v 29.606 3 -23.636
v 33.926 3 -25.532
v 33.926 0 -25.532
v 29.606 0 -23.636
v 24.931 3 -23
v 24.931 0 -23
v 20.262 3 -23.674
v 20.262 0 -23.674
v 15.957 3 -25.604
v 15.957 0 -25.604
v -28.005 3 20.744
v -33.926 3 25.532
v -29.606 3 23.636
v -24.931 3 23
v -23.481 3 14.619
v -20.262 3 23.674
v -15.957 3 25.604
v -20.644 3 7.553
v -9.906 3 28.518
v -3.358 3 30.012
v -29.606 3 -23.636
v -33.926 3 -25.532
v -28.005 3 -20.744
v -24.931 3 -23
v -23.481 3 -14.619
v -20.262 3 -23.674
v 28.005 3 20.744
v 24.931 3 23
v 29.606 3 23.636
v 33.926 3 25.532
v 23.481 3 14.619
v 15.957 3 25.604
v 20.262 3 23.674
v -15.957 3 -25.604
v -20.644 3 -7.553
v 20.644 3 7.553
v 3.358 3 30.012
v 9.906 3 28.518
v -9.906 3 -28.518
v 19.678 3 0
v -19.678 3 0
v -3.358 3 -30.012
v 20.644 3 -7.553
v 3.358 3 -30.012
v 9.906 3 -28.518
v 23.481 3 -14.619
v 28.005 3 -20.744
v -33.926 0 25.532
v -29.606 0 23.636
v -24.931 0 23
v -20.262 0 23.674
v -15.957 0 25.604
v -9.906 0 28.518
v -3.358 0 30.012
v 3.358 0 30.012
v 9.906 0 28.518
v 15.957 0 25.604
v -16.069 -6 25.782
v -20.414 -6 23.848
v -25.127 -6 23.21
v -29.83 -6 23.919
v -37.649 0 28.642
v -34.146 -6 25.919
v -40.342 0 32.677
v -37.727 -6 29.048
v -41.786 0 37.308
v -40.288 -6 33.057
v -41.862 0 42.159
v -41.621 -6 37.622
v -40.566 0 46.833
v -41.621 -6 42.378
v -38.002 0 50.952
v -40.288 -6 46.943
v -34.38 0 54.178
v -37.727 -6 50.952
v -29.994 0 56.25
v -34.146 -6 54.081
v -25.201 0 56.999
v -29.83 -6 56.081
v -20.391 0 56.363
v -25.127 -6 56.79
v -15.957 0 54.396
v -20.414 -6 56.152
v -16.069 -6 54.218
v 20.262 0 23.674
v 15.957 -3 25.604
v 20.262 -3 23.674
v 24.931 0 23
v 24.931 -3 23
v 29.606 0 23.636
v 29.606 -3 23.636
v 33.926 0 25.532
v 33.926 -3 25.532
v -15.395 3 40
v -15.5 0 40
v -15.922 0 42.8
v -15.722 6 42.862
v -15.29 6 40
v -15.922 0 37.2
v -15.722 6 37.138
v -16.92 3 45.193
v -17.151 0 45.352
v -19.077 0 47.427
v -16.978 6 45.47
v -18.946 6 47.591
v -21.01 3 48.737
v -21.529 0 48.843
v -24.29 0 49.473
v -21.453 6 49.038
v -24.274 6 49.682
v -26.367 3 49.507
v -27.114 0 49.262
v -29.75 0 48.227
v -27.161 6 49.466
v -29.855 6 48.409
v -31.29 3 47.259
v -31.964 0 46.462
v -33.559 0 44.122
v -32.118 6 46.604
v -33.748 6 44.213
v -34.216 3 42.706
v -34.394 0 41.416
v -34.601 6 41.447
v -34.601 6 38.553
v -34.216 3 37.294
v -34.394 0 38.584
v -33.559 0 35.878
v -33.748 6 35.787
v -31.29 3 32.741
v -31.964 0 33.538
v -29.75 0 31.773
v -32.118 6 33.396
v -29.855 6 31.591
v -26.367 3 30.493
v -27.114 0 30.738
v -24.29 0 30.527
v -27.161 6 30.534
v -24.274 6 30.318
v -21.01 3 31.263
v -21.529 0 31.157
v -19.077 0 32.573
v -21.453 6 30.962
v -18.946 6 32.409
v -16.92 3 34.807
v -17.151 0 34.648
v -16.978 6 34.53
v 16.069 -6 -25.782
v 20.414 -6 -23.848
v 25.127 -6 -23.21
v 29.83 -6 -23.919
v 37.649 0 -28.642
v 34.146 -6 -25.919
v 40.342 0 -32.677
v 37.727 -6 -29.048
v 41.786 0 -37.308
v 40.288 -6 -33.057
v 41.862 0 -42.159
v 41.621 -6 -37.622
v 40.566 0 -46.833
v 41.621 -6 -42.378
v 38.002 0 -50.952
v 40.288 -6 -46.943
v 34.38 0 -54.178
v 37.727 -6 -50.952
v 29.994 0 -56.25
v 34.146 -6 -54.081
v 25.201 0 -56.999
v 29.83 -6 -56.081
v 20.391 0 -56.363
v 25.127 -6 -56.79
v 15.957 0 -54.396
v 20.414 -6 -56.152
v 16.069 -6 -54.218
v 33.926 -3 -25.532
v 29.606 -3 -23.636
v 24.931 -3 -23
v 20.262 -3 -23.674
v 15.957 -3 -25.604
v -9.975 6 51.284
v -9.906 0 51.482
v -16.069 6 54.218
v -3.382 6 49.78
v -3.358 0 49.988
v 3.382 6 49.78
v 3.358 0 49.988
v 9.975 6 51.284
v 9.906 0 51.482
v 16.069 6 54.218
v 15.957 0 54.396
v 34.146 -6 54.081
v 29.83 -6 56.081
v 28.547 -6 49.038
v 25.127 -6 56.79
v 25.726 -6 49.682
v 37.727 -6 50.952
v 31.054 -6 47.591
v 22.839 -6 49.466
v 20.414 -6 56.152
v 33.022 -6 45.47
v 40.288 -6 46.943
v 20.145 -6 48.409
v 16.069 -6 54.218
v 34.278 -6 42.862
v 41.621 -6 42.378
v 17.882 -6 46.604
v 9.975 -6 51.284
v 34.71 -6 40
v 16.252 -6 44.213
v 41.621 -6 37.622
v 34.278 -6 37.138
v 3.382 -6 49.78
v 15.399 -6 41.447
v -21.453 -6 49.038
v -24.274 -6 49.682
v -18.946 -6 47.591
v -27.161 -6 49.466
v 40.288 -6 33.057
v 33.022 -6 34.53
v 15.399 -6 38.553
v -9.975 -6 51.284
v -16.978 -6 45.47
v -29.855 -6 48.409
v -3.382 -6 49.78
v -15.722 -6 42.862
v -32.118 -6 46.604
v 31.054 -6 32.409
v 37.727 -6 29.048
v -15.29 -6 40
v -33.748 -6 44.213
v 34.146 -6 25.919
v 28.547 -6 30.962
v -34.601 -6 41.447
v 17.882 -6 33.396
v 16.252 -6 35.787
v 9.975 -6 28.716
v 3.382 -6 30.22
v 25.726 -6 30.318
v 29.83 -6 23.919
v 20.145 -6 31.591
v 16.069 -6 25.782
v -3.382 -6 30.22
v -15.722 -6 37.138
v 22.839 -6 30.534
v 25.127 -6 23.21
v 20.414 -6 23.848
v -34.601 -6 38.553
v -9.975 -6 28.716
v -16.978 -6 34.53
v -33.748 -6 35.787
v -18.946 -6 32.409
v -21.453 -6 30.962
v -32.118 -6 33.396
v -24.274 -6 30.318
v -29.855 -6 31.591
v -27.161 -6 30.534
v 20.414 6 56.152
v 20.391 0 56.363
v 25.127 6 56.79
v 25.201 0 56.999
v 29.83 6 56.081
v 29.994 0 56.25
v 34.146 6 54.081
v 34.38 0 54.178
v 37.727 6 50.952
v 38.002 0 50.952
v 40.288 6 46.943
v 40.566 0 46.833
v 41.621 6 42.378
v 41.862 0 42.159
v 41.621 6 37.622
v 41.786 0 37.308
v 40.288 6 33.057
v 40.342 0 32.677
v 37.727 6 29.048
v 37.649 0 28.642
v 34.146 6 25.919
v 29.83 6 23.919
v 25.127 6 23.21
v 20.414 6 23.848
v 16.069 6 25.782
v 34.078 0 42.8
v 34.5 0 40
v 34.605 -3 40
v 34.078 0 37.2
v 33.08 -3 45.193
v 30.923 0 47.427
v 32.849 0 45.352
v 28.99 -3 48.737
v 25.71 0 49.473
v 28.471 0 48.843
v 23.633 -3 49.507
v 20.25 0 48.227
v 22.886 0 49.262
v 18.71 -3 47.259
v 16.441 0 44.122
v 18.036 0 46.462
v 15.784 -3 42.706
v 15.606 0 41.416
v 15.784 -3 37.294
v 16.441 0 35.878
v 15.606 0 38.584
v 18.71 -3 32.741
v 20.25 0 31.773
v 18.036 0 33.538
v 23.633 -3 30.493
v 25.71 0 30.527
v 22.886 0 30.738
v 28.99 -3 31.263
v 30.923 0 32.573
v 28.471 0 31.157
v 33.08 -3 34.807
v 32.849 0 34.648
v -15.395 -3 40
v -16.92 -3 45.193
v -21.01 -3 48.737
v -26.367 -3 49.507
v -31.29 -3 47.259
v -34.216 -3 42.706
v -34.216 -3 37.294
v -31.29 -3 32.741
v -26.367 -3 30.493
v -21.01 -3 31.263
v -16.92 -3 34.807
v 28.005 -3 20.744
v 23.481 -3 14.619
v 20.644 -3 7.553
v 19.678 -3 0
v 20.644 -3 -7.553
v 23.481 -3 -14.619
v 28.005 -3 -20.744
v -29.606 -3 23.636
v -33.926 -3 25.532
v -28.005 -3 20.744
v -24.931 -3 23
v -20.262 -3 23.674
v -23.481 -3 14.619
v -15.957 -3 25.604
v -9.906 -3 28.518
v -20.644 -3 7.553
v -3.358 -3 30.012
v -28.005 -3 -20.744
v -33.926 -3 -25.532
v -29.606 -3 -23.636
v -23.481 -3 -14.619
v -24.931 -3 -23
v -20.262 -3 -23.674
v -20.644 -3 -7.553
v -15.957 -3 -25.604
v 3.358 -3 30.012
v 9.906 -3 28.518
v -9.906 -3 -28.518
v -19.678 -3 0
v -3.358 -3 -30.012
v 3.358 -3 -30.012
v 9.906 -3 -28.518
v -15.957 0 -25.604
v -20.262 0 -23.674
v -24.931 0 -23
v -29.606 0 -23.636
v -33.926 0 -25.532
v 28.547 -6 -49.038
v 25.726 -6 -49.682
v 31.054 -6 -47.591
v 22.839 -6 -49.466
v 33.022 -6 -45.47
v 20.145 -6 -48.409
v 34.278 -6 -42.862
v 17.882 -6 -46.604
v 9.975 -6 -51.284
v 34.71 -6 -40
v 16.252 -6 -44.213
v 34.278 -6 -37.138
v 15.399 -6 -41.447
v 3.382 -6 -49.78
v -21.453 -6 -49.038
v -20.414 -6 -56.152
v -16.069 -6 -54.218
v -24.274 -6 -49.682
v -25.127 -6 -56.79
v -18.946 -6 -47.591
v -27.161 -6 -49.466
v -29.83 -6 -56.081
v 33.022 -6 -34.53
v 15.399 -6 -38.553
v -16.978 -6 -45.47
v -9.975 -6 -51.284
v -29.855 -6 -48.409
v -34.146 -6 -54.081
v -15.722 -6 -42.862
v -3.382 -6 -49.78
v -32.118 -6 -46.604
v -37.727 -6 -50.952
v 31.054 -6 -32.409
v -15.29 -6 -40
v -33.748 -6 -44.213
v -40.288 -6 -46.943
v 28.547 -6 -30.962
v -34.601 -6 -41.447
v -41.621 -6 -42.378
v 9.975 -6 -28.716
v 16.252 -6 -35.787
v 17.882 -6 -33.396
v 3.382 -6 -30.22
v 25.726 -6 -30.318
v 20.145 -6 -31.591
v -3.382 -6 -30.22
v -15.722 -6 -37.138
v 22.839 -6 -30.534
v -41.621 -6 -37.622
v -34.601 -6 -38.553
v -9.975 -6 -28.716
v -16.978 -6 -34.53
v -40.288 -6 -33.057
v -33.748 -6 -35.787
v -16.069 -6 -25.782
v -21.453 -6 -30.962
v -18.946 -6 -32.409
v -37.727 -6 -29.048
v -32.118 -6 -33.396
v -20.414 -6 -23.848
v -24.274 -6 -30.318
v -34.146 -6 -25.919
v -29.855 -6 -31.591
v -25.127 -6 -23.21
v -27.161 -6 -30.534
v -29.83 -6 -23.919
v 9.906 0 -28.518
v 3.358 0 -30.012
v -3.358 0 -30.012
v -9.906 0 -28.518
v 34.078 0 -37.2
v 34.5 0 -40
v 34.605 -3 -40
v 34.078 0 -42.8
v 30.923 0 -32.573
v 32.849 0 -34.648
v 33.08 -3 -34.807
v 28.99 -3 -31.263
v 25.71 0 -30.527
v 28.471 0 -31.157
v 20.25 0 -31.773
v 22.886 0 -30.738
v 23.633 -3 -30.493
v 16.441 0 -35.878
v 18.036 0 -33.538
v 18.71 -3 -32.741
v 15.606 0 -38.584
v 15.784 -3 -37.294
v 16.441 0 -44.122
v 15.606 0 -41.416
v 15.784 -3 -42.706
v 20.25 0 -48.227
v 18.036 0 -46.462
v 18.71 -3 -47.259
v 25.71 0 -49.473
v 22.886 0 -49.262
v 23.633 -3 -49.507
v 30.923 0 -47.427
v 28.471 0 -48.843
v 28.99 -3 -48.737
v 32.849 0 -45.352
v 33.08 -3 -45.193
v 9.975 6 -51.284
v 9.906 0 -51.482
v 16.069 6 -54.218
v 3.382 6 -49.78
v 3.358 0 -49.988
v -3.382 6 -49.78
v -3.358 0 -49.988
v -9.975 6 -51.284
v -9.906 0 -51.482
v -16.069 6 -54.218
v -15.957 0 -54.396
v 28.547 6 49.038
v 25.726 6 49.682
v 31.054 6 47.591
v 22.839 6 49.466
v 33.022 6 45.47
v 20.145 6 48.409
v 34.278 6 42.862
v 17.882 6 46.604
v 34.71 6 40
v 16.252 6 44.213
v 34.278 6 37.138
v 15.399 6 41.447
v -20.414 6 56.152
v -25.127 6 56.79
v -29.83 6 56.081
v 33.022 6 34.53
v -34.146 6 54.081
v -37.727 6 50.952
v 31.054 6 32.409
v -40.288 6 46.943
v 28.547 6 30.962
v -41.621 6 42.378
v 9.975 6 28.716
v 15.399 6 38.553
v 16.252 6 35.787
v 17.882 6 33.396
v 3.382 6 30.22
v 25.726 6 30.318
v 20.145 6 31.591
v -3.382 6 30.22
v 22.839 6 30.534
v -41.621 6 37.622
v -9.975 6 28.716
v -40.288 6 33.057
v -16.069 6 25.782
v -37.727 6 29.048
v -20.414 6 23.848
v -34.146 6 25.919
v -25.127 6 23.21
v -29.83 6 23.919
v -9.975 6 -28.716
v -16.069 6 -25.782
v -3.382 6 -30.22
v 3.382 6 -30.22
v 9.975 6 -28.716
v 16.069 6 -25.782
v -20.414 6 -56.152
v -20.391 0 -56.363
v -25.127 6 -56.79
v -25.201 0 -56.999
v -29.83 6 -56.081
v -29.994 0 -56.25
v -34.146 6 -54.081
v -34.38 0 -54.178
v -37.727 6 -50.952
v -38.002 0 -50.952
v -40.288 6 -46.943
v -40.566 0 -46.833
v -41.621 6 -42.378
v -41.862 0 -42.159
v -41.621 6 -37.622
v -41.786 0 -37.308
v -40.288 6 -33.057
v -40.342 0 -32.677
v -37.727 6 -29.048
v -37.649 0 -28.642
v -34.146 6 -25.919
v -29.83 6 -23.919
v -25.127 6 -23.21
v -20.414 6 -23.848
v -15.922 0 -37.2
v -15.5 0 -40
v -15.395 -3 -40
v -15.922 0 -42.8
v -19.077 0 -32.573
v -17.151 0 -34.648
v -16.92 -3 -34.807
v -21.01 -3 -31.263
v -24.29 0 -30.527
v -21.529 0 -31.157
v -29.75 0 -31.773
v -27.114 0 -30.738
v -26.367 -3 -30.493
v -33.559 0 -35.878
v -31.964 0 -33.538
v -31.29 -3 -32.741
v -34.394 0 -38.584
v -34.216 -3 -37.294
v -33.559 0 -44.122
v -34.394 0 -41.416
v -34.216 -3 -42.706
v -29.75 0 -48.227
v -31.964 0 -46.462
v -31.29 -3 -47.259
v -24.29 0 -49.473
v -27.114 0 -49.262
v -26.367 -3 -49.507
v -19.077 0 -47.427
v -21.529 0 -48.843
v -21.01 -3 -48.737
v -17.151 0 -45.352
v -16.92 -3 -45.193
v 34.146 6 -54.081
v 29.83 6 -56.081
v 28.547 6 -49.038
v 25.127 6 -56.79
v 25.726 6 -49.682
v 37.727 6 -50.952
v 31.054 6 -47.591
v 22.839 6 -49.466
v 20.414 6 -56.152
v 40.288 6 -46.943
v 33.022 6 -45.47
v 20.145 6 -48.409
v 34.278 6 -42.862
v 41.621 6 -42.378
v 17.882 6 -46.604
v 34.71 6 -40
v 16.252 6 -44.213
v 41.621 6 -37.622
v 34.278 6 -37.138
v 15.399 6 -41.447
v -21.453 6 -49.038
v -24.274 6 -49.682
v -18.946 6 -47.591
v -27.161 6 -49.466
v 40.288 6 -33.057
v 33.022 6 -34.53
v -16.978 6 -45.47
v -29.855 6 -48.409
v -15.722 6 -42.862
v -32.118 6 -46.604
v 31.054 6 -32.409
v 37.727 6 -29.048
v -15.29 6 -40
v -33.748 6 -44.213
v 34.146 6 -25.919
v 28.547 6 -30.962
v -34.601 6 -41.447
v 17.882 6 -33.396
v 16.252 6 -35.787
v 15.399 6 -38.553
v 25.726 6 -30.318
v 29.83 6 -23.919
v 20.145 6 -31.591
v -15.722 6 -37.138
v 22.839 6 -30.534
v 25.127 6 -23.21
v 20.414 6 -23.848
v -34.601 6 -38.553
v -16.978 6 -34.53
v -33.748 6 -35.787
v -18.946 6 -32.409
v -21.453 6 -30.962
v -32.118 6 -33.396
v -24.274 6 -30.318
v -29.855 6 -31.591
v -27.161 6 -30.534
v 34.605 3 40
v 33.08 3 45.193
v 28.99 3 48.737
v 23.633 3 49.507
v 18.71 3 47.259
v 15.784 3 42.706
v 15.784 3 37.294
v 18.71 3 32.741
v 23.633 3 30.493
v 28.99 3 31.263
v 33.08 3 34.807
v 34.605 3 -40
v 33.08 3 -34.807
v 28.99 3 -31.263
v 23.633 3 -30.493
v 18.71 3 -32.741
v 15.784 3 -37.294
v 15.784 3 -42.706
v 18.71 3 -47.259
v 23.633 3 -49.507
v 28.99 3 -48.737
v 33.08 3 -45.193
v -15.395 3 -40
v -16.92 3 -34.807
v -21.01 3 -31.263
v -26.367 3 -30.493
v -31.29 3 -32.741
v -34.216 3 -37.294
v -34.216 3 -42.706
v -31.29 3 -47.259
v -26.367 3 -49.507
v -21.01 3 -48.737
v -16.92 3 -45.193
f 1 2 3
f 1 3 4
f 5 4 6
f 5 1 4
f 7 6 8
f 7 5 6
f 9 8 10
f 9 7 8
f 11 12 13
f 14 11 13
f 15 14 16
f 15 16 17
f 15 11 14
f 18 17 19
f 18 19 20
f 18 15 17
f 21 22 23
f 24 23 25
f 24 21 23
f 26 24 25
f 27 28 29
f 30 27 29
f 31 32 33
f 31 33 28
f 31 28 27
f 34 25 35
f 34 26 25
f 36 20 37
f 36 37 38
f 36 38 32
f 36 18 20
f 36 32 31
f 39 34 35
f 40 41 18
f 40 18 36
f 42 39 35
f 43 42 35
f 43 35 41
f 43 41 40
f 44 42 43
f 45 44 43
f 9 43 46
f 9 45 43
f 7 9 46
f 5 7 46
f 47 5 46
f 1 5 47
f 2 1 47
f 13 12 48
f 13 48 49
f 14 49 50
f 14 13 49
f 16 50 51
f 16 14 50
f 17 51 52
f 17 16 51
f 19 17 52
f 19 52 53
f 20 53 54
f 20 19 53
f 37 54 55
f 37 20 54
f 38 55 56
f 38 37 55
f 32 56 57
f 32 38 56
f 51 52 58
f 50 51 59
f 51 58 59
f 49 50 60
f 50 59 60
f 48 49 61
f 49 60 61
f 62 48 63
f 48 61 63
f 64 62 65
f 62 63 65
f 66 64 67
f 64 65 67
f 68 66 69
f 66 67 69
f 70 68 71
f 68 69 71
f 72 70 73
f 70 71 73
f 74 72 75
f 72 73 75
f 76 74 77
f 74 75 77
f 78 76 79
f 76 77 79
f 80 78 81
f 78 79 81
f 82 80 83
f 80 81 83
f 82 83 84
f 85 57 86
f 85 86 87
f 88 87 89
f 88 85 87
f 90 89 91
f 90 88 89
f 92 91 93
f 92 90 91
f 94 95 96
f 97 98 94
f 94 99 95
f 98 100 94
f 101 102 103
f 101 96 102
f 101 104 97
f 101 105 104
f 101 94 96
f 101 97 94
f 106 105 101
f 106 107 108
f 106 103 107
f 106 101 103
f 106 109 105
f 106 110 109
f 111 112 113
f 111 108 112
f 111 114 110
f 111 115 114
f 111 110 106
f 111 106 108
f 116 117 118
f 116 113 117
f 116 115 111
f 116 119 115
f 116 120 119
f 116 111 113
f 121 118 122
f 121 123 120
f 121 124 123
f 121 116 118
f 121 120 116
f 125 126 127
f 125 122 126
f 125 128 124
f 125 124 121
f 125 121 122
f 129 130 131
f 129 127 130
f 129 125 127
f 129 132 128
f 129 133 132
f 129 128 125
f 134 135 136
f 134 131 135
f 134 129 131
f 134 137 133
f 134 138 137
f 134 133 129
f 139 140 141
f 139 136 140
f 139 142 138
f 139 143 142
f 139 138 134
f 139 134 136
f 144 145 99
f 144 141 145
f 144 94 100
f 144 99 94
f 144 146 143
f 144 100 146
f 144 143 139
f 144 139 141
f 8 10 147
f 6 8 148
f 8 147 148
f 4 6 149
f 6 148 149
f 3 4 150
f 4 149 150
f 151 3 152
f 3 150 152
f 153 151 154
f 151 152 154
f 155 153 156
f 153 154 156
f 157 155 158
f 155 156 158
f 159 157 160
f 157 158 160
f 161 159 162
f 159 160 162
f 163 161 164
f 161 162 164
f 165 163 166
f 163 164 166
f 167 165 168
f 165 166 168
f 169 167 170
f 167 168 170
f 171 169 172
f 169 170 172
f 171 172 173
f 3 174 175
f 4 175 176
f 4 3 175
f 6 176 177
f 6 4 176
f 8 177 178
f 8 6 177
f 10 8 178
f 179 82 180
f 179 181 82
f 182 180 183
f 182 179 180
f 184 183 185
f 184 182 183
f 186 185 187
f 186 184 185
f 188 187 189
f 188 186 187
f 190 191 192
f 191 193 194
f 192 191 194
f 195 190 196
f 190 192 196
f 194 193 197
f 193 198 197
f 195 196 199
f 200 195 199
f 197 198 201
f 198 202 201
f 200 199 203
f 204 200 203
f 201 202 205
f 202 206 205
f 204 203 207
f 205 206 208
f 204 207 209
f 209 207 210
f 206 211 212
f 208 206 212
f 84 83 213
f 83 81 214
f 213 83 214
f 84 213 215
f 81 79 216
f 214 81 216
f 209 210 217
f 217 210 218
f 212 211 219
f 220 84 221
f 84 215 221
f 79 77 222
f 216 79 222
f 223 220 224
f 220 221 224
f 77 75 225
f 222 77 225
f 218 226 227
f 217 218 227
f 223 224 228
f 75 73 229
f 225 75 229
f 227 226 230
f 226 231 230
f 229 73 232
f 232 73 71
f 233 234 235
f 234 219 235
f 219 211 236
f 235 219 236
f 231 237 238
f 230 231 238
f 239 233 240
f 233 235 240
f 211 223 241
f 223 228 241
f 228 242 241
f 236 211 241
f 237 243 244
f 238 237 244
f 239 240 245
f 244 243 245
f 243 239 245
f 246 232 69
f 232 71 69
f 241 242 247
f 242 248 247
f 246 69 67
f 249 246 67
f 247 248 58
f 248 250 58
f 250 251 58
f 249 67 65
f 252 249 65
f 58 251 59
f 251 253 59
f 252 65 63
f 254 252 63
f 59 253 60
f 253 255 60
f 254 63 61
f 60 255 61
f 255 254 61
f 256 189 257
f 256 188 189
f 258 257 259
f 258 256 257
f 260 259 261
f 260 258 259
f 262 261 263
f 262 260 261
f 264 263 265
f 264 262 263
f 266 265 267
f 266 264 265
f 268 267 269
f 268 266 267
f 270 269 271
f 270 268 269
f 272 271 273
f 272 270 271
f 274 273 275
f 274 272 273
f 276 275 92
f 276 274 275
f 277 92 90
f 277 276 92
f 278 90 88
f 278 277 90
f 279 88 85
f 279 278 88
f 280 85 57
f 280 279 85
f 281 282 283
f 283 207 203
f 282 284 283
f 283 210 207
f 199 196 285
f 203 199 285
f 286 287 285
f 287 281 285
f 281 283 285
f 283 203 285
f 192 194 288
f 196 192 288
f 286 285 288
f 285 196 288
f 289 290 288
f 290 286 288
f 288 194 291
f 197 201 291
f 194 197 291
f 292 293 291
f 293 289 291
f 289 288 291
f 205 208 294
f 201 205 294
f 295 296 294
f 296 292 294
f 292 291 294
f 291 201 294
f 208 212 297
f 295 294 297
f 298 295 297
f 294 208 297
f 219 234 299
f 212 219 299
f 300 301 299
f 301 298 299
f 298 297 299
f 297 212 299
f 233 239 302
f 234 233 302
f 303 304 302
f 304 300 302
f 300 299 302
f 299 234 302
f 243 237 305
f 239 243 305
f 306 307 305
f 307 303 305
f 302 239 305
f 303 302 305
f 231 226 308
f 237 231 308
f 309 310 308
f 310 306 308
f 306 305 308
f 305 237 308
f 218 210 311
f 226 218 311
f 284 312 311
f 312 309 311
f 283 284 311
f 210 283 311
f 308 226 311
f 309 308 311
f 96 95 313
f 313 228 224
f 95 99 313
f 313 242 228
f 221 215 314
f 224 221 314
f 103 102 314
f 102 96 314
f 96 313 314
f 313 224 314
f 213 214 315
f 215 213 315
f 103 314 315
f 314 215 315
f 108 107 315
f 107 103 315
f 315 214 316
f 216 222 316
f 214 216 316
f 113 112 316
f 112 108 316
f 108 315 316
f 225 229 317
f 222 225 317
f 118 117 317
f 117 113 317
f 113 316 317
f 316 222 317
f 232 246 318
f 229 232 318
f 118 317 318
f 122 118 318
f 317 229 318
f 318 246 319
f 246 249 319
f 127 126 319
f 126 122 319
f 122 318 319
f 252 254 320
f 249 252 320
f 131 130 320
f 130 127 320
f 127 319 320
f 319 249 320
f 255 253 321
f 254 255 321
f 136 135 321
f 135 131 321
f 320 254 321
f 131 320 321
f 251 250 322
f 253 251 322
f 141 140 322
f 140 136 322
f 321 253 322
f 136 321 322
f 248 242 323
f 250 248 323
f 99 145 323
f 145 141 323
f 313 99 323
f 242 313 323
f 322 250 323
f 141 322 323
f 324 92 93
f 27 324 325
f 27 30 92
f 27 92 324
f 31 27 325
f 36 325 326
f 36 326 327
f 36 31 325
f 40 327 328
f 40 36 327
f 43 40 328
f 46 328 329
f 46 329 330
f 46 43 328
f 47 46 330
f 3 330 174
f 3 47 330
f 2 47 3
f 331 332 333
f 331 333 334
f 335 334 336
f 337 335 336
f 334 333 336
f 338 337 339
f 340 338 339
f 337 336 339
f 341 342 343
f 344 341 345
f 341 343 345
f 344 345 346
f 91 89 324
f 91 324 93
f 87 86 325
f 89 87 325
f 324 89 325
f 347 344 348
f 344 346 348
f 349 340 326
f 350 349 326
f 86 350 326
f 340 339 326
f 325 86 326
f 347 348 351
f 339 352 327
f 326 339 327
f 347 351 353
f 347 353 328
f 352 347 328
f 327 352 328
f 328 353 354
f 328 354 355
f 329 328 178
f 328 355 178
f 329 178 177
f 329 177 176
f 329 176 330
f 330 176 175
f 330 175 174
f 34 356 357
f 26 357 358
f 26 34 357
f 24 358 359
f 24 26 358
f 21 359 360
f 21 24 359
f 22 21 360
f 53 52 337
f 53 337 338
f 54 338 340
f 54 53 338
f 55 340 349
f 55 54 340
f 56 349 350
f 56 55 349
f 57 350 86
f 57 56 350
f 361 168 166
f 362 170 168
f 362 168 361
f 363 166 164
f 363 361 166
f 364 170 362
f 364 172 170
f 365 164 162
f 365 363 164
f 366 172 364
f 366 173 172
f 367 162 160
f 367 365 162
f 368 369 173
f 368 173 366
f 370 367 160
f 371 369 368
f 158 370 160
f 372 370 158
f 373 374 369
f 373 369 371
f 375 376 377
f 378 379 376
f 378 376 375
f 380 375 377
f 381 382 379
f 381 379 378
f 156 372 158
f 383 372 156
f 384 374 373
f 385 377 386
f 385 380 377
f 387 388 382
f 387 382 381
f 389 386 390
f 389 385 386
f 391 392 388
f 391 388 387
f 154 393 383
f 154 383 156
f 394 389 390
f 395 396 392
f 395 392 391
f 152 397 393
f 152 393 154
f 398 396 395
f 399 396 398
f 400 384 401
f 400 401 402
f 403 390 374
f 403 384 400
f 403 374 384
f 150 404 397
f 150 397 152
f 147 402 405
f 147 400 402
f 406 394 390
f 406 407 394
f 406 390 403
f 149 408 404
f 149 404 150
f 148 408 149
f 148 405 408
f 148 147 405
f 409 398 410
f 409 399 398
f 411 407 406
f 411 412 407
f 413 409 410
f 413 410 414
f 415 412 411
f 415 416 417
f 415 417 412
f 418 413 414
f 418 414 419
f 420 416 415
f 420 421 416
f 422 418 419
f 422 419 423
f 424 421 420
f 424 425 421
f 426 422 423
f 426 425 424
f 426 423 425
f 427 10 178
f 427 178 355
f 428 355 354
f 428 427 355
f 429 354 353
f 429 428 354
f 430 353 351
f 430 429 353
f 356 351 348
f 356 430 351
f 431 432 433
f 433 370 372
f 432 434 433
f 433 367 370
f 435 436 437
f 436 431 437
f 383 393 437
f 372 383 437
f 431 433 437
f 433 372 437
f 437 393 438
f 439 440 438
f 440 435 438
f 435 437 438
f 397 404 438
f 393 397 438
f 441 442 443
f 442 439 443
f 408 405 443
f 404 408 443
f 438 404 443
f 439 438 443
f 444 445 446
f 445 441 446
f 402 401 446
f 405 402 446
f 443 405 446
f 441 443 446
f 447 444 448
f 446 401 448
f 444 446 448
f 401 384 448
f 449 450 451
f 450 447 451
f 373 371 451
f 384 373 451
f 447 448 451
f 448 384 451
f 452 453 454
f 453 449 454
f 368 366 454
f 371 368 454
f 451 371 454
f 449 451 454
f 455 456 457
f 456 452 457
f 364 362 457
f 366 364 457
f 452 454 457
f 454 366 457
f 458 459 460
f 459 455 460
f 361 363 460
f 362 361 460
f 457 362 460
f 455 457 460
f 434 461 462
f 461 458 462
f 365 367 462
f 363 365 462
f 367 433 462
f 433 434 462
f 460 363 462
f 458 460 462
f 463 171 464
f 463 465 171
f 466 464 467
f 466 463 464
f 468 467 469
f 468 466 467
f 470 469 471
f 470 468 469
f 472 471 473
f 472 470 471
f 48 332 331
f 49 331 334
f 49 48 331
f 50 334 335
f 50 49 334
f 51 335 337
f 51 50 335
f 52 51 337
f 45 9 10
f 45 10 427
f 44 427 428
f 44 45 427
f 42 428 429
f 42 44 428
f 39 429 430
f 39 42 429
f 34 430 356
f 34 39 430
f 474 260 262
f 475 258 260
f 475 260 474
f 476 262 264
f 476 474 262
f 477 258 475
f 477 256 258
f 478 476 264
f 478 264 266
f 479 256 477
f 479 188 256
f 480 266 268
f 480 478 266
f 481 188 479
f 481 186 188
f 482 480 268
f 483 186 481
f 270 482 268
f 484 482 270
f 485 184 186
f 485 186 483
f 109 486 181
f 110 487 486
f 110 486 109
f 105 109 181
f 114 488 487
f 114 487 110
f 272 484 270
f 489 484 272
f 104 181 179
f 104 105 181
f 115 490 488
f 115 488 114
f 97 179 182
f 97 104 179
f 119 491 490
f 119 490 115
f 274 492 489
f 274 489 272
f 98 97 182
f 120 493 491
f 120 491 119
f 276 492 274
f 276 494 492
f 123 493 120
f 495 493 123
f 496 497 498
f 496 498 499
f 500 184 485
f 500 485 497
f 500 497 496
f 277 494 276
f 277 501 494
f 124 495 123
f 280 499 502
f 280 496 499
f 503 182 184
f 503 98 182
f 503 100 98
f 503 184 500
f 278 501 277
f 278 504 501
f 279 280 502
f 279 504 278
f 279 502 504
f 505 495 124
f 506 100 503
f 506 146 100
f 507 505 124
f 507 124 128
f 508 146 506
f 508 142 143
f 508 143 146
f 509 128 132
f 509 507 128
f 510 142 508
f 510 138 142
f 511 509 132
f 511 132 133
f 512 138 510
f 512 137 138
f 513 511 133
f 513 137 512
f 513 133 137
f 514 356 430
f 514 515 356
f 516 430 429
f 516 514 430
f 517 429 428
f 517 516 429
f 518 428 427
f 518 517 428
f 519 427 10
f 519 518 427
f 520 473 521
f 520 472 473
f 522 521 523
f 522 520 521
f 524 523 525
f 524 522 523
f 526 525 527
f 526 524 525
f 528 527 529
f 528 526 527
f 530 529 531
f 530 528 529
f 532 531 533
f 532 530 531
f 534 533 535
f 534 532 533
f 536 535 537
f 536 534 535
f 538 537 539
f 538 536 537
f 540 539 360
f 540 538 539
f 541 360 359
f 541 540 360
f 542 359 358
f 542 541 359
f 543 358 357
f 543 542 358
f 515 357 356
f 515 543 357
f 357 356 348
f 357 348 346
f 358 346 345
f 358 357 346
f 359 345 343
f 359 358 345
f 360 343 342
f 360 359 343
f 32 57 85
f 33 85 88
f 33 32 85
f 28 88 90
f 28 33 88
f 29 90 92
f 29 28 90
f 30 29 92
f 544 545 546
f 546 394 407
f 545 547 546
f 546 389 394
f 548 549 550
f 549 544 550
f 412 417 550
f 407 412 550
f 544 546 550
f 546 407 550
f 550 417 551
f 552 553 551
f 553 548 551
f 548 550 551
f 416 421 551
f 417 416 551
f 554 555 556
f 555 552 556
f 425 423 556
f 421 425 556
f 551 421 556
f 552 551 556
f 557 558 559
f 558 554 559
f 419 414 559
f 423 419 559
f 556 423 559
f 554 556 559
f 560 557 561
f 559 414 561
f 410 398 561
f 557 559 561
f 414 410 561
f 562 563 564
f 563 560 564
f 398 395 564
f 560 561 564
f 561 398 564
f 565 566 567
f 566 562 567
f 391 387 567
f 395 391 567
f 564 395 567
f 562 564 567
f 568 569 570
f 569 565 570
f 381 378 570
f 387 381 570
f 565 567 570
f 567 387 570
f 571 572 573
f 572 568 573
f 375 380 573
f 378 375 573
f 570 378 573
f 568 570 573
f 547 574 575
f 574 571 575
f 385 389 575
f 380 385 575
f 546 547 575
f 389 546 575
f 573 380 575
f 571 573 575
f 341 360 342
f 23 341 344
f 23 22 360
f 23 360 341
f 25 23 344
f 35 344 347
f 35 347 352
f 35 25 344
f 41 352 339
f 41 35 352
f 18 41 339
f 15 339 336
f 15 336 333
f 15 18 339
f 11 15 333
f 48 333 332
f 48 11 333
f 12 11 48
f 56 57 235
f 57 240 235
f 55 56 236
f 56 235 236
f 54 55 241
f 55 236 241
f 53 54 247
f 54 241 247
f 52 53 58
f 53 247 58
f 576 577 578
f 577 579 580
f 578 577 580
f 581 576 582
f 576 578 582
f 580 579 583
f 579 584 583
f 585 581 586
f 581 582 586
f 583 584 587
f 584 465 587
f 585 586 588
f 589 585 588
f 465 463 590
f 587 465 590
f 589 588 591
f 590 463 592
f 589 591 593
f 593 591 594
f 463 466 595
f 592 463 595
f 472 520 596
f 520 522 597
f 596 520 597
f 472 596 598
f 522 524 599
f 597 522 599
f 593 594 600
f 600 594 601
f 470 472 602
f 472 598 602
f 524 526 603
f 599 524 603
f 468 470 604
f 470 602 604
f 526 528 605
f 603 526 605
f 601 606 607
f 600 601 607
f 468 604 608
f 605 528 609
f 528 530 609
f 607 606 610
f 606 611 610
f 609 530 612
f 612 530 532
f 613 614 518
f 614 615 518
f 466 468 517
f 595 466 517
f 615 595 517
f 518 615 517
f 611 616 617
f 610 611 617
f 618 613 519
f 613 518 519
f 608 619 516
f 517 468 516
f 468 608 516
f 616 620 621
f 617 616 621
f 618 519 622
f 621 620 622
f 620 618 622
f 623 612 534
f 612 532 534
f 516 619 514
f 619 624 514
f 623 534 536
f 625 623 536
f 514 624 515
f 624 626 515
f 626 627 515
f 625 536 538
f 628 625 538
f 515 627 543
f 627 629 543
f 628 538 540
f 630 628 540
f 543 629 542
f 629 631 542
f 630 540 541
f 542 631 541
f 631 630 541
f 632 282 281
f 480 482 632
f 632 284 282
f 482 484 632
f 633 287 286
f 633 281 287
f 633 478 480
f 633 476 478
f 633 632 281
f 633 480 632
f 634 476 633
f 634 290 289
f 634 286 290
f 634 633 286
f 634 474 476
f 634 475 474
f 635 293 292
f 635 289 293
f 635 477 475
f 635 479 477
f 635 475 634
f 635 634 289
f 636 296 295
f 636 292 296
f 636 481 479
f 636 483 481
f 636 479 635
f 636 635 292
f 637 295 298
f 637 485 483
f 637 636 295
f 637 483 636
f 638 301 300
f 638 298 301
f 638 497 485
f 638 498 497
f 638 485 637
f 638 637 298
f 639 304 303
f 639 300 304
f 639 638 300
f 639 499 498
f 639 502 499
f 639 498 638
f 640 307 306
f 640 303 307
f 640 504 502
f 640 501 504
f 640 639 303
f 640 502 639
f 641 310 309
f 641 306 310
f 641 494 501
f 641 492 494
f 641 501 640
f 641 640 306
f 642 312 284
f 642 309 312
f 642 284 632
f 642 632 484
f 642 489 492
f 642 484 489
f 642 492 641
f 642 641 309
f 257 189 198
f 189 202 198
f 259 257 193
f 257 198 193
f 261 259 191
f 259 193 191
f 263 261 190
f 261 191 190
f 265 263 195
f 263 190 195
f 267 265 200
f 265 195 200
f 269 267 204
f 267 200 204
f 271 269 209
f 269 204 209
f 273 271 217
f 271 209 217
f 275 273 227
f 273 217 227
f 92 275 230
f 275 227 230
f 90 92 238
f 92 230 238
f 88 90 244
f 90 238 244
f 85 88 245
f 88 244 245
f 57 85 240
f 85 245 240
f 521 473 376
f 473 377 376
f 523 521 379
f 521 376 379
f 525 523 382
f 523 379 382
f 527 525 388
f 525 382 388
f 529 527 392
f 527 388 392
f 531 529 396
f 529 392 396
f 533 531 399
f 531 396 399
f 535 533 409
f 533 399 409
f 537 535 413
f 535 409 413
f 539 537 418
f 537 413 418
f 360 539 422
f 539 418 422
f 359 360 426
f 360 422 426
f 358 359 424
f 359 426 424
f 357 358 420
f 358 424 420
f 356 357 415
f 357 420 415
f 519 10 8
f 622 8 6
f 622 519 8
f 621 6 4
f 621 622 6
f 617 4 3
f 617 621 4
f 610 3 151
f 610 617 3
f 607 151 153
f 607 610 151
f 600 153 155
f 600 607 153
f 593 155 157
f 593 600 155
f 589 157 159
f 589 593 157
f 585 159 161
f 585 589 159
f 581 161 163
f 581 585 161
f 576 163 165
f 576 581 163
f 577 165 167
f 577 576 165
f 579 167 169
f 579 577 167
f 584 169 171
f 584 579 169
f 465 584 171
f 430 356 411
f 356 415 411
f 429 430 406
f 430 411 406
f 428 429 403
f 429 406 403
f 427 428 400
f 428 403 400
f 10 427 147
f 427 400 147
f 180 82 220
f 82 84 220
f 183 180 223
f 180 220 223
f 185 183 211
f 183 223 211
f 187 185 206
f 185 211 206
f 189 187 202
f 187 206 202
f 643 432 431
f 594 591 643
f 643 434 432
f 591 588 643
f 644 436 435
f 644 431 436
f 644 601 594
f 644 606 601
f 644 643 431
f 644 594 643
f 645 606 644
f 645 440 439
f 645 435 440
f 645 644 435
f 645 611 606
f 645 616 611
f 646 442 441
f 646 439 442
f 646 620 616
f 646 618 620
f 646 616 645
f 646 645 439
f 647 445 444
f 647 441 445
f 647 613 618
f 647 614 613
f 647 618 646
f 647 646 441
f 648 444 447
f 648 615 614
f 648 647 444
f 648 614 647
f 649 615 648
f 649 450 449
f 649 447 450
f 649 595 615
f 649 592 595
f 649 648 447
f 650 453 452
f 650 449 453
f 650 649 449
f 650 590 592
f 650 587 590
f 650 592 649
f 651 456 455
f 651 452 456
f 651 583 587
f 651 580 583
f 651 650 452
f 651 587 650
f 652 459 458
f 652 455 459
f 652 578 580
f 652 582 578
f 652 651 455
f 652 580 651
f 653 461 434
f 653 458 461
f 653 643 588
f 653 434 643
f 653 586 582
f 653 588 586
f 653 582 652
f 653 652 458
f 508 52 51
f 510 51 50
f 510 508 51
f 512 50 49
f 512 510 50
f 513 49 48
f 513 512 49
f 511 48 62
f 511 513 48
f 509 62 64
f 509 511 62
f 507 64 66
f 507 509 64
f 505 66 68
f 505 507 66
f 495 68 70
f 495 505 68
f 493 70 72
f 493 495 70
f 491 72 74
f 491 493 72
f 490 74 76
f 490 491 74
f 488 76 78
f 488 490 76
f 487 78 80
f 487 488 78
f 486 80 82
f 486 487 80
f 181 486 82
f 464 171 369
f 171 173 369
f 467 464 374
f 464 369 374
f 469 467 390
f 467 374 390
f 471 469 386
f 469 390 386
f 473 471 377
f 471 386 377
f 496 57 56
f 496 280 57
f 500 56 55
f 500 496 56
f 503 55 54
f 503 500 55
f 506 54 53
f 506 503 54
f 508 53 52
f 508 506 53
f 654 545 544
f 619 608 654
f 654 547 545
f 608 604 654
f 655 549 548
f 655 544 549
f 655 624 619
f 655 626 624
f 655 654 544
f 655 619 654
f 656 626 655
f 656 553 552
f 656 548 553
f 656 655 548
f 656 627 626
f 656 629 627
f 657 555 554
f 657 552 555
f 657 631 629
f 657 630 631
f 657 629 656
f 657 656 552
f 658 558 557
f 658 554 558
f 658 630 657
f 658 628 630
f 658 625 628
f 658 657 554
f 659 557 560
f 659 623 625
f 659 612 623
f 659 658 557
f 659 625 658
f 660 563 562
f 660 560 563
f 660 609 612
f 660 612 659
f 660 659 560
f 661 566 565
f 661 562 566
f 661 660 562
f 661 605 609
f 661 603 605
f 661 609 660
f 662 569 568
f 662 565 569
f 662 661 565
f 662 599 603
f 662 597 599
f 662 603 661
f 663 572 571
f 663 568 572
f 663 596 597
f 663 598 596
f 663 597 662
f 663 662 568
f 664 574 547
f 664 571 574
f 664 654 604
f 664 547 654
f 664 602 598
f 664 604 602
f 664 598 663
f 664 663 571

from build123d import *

# Parameters (mm, degrees)
BOSS_EXTRUDE2_DEPTH           = 3
SKETCH1_4_R                   = 9.5
BOSS_EXTRUDE3_DEPTH           = 6
BOSS_EXTRUDE3_TAPER           = 2
BOSS_EXTRUDE3_OTHER_WAY_DEPTH = 6
BOSS_EXTRUDE3_OTHER_WAY_TAPER = 2


with BuildPart() as part:
    # Sketch1 → Boss-Extrude2 (new, symmetric)
    with BuildSketch(Plane(origin=(0, 0, 0), x_dir=(1, 0, 0), z_dir=(0, 1, 0))):
        with BuildLine():
            ThreePointArc((15.957446809, -25.60443708), (24.931387734, -23.000138461), (33.926058108, -25.531914894))
            ThreePointArc((33.926058108, -25.531914894), (19.677925359, 0), (33.926058108, 25.531914894))
            ThreePointArc((33.926058108, 25.531914894), (24.931387734, 23.000138461), (15.957446809, 25.60443708))
            ThreePointArc((15.957446809, 25.60443708), (0, 30.200502516), (-15.957446809, 25.60443708))
            ThreePointArc((-15.957446809, 25.60443708), (-24.931387734, 23.000138461), (-33.926058108, 25.531914894))
            ThreePointArc((-33.926058108, 25.531914894), (-19.677925359, 0), (-33.926058108, -25.531914894))
            ThreePointArc((-33.926058108, -25.531914894), (-24.931387734, -23.000138461), (-15.957446809, -25.60443708))
            ThreePointArc((-15.957446809, -25.60443708), (0, -30.200502516), (15.957446809, -25.60443708))
        make_face()
    extrude(amount=BOSS_EXTRUDE2_DEPTH, both=True)



with BuildPart() as body_2:
    # Sketch1<4> → Boss-Extrude3 (new body)
    # profile 1 of 2: a face of its own
    with BuildSketch(Plane(origin=(0, 0, 0), x_dir=(1, 0, 0), z_dir=(0, 1, 0))):
        with BuildLine():
            ThreePointArc((15.957446809, 54.39556292), (0, 49.799497484), (-15.957446809, 54.39556292))
            ThreePointArc((-15.957446809, 54.39556292), (-42, 40), (-15.957446809, 25.60443708))
            ThreePointArc((-15.957446809, 25.60443708), (0, 30.200502516), (15.957446809, 25.60443708))
            ThreePointArc((15.957446809, 25.60443708), (42, 40), (15.957446809, 54.39556292))
        make_face()
        with Locations((-25, 40)):
            Circle(SKETCH1_4_R, mode=Mode.SUBTRACT)
        with Locations((25, 40)):
            Circle(SKETCH1_4_R, mode=Mode.SUBTRACT)
    # profile 2 of 2: a face of its own
    with BuildSketch(Plane(origin=(0, 0, 0), x_dir=(1, 0, 0), z_dir=(0, 1, 0))):
        with BuildLine():
            ThreePointArc((-15.957446809, -25.60443708), (-42, -40), (-15.957446809, -54.39556292))
            ThreePointArc((-15.957446809, -54.39556292), (0, -49.799497484), (15.957446809, -54.39556292))
            ThreePointArc((15.957446809, -54.39556292), (42, -40), (15.957446809, -25.60443708))
            ThreePointArc((15.957446809, -25.60443708), (0, -30.200502516), (-15.957446809, -25.60443708))
        make_face()
        with Locations((25, -40)):
            Circle(SKETCH1_4_R, mode=Mode.SUBTRACT)
        with Locations((-25, -40)):
            Circle(SKETCH1_4_R, mode=Mode.SUBTRACT)
    extrude(amount=BOSS_EXTRUDE3_DEPTH, taper=BOSS_EXTRUDE3_TAPER)


with BuildPart() as part_1:
    add(part.part)

    add(body_2.part)  # Boss-Extrude3 other way merges body 2
    # Sketch1<4> → Boss-Extrude3 other way (add)
    # profile 1 of 2: a face of its own
    with BuildSketch(Plane(origin=(0, 0, 0), x_dir=(1, 0, 0), z_dir=(0, 1, 0))):
        with BuildLine():
            ThreePointArc((15.957446809, 54.39556292), (0, 49.799497484), (-15.957446809, 54.39556292))
            ThreePointArc((-15.957446809, 54.39556292), (-42, 40), (-15.957446809, 25.60443708))
            ThreePointArc((-15.957446809, 25.60443708), (0, 30.200502516), (15.957446809, 25.60443708))
            ThreePointArc((15.957446809, 25.60443708), (42, 40), (15.957446809, 54.39556292))
        make_face()
        with Locations((-25, 40)):
            Circle(SKETCH1_4_R, mode=Mode.SUBTRACT)
        with Locations((25, 40)):
            Circle(SKETCH1_4_R, mode=Mode.SUBTRACT)
    # profile 2 of 2: a face of its own
    with BuildSketch(Plane(origin=(0, 0, 0), x_dir=(1, 0, 0), z_dir=(0, 1, 0))):
        with BuildLine():
            ThreePointArc((-15.957446809, -25.60443708), (-42, -40), (-15.957446809, -54.39556292))
            ThreePointArc((-15.957446809, -54.39556292), (0, -49.799497484), (15.957446809, -54.39556292))
            ThreePointArc((15.957446809, -54.39556292), (42, -40), (15.957446809, -25.60443708))
            ThreePointArc((15.957446809, -25.60443708), (0, -30.200502516), (-15.957446809, -25.60443708))
        make_face()
        with Locations((25, -40)):
            Circle(SKETCH1_4_R, mode=Mode.SUBTRACT)
        with Locations((-25, -40)):
            Circle(SKETCH1_4_R, mode=Mode.SUBTRACT)
    extrude(amount=-BOSS_EXTRUDE3_OTHER_WAY_DEPTH, taper=BOSS_EXTRUDE3_OTHER_WAY_TAPER)


solid = part_1.part
